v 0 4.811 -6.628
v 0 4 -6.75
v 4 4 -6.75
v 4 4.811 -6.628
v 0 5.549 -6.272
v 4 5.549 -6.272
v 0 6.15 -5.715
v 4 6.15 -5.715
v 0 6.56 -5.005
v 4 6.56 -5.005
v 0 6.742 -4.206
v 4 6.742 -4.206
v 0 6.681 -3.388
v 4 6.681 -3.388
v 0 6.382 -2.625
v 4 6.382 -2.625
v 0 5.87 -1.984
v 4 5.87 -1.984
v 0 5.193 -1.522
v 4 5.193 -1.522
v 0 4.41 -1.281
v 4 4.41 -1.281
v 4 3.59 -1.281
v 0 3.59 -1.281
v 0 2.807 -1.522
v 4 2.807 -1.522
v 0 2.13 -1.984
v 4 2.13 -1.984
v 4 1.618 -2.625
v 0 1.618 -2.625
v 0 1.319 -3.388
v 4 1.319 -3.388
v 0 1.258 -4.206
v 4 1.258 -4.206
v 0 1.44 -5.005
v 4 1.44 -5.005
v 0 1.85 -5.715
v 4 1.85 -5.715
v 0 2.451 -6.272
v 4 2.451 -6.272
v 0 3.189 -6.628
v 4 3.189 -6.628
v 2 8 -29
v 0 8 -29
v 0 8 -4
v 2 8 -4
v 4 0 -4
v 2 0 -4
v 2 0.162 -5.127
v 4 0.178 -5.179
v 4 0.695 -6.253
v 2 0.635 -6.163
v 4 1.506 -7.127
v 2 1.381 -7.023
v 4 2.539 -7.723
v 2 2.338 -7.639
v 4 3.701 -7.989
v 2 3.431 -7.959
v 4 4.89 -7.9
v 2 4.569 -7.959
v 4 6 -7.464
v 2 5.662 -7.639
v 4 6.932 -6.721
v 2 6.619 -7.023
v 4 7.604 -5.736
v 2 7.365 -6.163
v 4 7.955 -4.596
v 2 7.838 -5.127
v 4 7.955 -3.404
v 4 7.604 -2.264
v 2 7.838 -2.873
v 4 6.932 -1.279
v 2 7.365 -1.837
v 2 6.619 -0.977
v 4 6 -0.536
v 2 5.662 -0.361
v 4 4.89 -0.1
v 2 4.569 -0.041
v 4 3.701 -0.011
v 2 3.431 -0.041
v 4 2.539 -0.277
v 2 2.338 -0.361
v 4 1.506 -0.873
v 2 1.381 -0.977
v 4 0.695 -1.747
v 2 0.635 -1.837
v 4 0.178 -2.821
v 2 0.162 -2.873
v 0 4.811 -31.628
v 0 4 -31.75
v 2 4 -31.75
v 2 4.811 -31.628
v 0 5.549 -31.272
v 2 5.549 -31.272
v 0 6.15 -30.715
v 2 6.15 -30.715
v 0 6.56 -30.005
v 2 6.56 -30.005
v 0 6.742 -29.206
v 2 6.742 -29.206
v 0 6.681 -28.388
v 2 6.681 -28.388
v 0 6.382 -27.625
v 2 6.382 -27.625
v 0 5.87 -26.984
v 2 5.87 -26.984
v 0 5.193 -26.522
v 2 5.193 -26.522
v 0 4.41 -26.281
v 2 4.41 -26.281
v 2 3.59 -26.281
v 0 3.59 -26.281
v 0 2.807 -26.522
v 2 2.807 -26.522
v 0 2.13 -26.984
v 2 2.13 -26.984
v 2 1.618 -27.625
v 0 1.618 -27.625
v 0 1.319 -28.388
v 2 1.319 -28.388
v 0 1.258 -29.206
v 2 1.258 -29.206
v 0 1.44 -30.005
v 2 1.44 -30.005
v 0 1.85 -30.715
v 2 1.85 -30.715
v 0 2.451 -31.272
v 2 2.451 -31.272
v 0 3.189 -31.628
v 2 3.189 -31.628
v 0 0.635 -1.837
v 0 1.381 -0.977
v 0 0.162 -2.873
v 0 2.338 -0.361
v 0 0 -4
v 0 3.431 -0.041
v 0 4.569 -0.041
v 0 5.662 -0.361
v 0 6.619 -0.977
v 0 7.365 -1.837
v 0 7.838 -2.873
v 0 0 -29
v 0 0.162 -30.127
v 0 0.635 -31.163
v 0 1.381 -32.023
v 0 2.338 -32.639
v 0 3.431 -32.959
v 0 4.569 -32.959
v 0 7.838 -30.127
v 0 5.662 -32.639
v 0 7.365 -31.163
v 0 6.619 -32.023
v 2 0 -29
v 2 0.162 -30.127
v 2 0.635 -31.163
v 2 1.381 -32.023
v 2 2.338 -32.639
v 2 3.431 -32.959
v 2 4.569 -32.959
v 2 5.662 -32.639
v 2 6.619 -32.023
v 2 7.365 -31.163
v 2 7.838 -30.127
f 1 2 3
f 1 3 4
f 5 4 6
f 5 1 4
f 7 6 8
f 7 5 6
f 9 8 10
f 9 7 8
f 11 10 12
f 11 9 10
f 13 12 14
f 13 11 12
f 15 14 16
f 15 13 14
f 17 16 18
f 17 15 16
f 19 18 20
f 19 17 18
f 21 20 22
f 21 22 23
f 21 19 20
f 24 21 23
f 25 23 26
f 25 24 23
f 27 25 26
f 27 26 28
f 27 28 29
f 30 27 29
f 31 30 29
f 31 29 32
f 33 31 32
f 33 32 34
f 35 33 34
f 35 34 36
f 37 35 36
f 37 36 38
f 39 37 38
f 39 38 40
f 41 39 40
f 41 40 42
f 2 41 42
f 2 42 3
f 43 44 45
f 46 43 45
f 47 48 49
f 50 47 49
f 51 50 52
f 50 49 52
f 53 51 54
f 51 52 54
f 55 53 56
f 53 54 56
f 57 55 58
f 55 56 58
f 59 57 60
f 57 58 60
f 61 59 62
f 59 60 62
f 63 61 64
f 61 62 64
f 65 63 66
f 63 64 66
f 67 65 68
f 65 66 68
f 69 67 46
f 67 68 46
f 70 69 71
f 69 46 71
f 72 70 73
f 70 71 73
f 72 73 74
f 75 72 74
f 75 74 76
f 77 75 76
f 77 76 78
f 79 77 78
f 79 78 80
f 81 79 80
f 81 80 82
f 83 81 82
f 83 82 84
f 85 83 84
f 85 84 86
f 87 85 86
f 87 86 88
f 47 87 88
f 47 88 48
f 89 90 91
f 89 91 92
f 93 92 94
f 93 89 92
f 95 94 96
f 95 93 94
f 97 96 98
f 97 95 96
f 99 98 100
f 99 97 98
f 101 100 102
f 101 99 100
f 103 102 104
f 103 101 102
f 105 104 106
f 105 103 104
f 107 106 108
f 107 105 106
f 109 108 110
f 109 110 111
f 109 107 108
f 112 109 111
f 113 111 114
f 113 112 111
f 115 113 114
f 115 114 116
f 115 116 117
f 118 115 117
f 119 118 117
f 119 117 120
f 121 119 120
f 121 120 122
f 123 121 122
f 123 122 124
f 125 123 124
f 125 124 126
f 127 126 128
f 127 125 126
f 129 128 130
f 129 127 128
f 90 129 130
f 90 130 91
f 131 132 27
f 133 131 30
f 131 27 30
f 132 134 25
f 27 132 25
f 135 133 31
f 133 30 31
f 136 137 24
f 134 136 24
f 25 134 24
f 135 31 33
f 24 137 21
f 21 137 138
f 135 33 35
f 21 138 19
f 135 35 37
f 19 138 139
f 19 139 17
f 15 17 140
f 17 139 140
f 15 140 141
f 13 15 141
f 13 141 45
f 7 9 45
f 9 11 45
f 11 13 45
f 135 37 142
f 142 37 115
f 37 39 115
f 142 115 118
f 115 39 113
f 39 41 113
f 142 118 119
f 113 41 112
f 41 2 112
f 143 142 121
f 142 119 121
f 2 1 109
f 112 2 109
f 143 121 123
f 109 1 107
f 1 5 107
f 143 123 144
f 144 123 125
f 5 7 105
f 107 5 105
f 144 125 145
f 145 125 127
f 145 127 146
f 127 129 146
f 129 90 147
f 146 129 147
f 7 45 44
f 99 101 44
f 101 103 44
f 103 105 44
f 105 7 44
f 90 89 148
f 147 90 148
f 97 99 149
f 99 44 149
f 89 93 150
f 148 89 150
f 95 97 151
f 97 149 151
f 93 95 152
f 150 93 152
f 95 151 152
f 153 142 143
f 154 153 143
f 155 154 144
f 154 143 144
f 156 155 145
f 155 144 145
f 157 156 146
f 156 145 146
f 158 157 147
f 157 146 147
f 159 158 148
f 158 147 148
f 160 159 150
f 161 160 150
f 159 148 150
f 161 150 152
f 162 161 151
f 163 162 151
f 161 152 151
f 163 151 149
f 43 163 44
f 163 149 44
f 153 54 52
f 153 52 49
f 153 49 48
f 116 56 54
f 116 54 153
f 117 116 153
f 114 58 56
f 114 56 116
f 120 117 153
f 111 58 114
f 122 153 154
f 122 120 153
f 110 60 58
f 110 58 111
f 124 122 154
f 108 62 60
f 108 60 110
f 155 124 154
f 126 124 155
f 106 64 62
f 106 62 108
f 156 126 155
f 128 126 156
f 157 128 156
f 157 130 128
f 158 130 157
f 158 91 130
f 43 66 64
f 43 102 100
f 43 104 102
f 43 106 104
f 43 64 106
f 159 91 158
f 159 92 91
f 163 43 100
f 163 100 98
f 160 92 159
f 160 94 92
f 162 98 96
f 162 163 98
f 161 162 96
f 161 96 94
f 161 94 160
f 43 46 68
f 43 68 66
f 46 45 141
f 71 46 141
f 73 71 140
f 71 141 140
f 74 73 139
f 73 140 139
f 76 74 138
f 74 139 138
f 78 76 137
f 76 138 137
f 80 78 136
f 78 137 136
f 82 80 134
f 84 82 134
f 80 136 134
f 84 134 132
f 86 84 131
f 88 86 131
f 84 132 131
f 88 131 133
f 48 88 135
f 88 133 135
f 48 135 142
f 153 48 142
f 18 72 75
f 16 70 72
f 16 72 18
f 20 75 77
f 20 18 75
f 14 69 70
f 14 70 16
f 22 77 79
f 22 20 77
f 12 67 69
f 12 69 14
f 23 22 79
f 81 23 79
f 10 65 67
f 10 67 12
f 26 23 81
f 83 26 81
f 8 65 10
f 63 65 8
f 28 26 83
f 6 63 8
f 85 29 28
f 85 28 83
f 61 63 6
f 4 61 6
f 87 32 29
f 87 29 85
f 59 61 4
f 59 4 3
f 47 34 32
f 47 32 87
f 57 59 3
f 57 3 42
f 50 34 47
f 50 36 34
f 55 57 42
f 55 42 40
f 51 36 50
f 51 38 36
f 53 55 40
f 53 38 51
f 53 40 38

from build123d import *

# Parameters (mm, degrees)
SKETCH1_R           = 2.75
BOSS_EXTRUDE1_DEPTH = 2
SKETCH2_R           = 4
SKETCH2_R_2         = 2.75
BOSS_EXTRUDE2_DEPTH = 4


with BuildPart() as part:
    # Sketch1 → Boss-Extrude1 (new body)
    with BuildSketch(Plane(origin=(0, 0, 0), x_dir=(0, 0, -1), z_dir=(1, 0, 0))):
        with BuildLine():
            Line((4, 0), (29, 0))
            ThreePointArc((29, 0), (33, 4), (29, 8))
            Line((29, 8), (4, 8))
            ThreePointArc((4, 8), (0, 4), (4, 0))
        make_face()
        with Locations((4, 4)):
            Circle(SKETCH1_R, mode=Mode.SUBTRACT)
        with Locations((29, 4)):
            Circle(SKETCH1_R, mode=Mode.SUBTRACT)
    extrude(amount=BOSS_EXTRUDE1_DEPTH)

    # Sketch2 → Boss-Extrude2 (add)
    with BuildSketch(Plane(origin=(0, 0, 0), x_dir=(0, 0, -1), z_dir=(1, 0, 0))):
        with Locations(Location((4, 4, 0), (0, 0, 270))):
            Circle(SKETCH2_R)
        with Locations((4, 4)):
            Circle(SKETCH2_R_2, mode=Mode.SUBTRACT)
    extrude(amount=BOSS_EXTRUDE2_DEPTH)


solid = part.part
